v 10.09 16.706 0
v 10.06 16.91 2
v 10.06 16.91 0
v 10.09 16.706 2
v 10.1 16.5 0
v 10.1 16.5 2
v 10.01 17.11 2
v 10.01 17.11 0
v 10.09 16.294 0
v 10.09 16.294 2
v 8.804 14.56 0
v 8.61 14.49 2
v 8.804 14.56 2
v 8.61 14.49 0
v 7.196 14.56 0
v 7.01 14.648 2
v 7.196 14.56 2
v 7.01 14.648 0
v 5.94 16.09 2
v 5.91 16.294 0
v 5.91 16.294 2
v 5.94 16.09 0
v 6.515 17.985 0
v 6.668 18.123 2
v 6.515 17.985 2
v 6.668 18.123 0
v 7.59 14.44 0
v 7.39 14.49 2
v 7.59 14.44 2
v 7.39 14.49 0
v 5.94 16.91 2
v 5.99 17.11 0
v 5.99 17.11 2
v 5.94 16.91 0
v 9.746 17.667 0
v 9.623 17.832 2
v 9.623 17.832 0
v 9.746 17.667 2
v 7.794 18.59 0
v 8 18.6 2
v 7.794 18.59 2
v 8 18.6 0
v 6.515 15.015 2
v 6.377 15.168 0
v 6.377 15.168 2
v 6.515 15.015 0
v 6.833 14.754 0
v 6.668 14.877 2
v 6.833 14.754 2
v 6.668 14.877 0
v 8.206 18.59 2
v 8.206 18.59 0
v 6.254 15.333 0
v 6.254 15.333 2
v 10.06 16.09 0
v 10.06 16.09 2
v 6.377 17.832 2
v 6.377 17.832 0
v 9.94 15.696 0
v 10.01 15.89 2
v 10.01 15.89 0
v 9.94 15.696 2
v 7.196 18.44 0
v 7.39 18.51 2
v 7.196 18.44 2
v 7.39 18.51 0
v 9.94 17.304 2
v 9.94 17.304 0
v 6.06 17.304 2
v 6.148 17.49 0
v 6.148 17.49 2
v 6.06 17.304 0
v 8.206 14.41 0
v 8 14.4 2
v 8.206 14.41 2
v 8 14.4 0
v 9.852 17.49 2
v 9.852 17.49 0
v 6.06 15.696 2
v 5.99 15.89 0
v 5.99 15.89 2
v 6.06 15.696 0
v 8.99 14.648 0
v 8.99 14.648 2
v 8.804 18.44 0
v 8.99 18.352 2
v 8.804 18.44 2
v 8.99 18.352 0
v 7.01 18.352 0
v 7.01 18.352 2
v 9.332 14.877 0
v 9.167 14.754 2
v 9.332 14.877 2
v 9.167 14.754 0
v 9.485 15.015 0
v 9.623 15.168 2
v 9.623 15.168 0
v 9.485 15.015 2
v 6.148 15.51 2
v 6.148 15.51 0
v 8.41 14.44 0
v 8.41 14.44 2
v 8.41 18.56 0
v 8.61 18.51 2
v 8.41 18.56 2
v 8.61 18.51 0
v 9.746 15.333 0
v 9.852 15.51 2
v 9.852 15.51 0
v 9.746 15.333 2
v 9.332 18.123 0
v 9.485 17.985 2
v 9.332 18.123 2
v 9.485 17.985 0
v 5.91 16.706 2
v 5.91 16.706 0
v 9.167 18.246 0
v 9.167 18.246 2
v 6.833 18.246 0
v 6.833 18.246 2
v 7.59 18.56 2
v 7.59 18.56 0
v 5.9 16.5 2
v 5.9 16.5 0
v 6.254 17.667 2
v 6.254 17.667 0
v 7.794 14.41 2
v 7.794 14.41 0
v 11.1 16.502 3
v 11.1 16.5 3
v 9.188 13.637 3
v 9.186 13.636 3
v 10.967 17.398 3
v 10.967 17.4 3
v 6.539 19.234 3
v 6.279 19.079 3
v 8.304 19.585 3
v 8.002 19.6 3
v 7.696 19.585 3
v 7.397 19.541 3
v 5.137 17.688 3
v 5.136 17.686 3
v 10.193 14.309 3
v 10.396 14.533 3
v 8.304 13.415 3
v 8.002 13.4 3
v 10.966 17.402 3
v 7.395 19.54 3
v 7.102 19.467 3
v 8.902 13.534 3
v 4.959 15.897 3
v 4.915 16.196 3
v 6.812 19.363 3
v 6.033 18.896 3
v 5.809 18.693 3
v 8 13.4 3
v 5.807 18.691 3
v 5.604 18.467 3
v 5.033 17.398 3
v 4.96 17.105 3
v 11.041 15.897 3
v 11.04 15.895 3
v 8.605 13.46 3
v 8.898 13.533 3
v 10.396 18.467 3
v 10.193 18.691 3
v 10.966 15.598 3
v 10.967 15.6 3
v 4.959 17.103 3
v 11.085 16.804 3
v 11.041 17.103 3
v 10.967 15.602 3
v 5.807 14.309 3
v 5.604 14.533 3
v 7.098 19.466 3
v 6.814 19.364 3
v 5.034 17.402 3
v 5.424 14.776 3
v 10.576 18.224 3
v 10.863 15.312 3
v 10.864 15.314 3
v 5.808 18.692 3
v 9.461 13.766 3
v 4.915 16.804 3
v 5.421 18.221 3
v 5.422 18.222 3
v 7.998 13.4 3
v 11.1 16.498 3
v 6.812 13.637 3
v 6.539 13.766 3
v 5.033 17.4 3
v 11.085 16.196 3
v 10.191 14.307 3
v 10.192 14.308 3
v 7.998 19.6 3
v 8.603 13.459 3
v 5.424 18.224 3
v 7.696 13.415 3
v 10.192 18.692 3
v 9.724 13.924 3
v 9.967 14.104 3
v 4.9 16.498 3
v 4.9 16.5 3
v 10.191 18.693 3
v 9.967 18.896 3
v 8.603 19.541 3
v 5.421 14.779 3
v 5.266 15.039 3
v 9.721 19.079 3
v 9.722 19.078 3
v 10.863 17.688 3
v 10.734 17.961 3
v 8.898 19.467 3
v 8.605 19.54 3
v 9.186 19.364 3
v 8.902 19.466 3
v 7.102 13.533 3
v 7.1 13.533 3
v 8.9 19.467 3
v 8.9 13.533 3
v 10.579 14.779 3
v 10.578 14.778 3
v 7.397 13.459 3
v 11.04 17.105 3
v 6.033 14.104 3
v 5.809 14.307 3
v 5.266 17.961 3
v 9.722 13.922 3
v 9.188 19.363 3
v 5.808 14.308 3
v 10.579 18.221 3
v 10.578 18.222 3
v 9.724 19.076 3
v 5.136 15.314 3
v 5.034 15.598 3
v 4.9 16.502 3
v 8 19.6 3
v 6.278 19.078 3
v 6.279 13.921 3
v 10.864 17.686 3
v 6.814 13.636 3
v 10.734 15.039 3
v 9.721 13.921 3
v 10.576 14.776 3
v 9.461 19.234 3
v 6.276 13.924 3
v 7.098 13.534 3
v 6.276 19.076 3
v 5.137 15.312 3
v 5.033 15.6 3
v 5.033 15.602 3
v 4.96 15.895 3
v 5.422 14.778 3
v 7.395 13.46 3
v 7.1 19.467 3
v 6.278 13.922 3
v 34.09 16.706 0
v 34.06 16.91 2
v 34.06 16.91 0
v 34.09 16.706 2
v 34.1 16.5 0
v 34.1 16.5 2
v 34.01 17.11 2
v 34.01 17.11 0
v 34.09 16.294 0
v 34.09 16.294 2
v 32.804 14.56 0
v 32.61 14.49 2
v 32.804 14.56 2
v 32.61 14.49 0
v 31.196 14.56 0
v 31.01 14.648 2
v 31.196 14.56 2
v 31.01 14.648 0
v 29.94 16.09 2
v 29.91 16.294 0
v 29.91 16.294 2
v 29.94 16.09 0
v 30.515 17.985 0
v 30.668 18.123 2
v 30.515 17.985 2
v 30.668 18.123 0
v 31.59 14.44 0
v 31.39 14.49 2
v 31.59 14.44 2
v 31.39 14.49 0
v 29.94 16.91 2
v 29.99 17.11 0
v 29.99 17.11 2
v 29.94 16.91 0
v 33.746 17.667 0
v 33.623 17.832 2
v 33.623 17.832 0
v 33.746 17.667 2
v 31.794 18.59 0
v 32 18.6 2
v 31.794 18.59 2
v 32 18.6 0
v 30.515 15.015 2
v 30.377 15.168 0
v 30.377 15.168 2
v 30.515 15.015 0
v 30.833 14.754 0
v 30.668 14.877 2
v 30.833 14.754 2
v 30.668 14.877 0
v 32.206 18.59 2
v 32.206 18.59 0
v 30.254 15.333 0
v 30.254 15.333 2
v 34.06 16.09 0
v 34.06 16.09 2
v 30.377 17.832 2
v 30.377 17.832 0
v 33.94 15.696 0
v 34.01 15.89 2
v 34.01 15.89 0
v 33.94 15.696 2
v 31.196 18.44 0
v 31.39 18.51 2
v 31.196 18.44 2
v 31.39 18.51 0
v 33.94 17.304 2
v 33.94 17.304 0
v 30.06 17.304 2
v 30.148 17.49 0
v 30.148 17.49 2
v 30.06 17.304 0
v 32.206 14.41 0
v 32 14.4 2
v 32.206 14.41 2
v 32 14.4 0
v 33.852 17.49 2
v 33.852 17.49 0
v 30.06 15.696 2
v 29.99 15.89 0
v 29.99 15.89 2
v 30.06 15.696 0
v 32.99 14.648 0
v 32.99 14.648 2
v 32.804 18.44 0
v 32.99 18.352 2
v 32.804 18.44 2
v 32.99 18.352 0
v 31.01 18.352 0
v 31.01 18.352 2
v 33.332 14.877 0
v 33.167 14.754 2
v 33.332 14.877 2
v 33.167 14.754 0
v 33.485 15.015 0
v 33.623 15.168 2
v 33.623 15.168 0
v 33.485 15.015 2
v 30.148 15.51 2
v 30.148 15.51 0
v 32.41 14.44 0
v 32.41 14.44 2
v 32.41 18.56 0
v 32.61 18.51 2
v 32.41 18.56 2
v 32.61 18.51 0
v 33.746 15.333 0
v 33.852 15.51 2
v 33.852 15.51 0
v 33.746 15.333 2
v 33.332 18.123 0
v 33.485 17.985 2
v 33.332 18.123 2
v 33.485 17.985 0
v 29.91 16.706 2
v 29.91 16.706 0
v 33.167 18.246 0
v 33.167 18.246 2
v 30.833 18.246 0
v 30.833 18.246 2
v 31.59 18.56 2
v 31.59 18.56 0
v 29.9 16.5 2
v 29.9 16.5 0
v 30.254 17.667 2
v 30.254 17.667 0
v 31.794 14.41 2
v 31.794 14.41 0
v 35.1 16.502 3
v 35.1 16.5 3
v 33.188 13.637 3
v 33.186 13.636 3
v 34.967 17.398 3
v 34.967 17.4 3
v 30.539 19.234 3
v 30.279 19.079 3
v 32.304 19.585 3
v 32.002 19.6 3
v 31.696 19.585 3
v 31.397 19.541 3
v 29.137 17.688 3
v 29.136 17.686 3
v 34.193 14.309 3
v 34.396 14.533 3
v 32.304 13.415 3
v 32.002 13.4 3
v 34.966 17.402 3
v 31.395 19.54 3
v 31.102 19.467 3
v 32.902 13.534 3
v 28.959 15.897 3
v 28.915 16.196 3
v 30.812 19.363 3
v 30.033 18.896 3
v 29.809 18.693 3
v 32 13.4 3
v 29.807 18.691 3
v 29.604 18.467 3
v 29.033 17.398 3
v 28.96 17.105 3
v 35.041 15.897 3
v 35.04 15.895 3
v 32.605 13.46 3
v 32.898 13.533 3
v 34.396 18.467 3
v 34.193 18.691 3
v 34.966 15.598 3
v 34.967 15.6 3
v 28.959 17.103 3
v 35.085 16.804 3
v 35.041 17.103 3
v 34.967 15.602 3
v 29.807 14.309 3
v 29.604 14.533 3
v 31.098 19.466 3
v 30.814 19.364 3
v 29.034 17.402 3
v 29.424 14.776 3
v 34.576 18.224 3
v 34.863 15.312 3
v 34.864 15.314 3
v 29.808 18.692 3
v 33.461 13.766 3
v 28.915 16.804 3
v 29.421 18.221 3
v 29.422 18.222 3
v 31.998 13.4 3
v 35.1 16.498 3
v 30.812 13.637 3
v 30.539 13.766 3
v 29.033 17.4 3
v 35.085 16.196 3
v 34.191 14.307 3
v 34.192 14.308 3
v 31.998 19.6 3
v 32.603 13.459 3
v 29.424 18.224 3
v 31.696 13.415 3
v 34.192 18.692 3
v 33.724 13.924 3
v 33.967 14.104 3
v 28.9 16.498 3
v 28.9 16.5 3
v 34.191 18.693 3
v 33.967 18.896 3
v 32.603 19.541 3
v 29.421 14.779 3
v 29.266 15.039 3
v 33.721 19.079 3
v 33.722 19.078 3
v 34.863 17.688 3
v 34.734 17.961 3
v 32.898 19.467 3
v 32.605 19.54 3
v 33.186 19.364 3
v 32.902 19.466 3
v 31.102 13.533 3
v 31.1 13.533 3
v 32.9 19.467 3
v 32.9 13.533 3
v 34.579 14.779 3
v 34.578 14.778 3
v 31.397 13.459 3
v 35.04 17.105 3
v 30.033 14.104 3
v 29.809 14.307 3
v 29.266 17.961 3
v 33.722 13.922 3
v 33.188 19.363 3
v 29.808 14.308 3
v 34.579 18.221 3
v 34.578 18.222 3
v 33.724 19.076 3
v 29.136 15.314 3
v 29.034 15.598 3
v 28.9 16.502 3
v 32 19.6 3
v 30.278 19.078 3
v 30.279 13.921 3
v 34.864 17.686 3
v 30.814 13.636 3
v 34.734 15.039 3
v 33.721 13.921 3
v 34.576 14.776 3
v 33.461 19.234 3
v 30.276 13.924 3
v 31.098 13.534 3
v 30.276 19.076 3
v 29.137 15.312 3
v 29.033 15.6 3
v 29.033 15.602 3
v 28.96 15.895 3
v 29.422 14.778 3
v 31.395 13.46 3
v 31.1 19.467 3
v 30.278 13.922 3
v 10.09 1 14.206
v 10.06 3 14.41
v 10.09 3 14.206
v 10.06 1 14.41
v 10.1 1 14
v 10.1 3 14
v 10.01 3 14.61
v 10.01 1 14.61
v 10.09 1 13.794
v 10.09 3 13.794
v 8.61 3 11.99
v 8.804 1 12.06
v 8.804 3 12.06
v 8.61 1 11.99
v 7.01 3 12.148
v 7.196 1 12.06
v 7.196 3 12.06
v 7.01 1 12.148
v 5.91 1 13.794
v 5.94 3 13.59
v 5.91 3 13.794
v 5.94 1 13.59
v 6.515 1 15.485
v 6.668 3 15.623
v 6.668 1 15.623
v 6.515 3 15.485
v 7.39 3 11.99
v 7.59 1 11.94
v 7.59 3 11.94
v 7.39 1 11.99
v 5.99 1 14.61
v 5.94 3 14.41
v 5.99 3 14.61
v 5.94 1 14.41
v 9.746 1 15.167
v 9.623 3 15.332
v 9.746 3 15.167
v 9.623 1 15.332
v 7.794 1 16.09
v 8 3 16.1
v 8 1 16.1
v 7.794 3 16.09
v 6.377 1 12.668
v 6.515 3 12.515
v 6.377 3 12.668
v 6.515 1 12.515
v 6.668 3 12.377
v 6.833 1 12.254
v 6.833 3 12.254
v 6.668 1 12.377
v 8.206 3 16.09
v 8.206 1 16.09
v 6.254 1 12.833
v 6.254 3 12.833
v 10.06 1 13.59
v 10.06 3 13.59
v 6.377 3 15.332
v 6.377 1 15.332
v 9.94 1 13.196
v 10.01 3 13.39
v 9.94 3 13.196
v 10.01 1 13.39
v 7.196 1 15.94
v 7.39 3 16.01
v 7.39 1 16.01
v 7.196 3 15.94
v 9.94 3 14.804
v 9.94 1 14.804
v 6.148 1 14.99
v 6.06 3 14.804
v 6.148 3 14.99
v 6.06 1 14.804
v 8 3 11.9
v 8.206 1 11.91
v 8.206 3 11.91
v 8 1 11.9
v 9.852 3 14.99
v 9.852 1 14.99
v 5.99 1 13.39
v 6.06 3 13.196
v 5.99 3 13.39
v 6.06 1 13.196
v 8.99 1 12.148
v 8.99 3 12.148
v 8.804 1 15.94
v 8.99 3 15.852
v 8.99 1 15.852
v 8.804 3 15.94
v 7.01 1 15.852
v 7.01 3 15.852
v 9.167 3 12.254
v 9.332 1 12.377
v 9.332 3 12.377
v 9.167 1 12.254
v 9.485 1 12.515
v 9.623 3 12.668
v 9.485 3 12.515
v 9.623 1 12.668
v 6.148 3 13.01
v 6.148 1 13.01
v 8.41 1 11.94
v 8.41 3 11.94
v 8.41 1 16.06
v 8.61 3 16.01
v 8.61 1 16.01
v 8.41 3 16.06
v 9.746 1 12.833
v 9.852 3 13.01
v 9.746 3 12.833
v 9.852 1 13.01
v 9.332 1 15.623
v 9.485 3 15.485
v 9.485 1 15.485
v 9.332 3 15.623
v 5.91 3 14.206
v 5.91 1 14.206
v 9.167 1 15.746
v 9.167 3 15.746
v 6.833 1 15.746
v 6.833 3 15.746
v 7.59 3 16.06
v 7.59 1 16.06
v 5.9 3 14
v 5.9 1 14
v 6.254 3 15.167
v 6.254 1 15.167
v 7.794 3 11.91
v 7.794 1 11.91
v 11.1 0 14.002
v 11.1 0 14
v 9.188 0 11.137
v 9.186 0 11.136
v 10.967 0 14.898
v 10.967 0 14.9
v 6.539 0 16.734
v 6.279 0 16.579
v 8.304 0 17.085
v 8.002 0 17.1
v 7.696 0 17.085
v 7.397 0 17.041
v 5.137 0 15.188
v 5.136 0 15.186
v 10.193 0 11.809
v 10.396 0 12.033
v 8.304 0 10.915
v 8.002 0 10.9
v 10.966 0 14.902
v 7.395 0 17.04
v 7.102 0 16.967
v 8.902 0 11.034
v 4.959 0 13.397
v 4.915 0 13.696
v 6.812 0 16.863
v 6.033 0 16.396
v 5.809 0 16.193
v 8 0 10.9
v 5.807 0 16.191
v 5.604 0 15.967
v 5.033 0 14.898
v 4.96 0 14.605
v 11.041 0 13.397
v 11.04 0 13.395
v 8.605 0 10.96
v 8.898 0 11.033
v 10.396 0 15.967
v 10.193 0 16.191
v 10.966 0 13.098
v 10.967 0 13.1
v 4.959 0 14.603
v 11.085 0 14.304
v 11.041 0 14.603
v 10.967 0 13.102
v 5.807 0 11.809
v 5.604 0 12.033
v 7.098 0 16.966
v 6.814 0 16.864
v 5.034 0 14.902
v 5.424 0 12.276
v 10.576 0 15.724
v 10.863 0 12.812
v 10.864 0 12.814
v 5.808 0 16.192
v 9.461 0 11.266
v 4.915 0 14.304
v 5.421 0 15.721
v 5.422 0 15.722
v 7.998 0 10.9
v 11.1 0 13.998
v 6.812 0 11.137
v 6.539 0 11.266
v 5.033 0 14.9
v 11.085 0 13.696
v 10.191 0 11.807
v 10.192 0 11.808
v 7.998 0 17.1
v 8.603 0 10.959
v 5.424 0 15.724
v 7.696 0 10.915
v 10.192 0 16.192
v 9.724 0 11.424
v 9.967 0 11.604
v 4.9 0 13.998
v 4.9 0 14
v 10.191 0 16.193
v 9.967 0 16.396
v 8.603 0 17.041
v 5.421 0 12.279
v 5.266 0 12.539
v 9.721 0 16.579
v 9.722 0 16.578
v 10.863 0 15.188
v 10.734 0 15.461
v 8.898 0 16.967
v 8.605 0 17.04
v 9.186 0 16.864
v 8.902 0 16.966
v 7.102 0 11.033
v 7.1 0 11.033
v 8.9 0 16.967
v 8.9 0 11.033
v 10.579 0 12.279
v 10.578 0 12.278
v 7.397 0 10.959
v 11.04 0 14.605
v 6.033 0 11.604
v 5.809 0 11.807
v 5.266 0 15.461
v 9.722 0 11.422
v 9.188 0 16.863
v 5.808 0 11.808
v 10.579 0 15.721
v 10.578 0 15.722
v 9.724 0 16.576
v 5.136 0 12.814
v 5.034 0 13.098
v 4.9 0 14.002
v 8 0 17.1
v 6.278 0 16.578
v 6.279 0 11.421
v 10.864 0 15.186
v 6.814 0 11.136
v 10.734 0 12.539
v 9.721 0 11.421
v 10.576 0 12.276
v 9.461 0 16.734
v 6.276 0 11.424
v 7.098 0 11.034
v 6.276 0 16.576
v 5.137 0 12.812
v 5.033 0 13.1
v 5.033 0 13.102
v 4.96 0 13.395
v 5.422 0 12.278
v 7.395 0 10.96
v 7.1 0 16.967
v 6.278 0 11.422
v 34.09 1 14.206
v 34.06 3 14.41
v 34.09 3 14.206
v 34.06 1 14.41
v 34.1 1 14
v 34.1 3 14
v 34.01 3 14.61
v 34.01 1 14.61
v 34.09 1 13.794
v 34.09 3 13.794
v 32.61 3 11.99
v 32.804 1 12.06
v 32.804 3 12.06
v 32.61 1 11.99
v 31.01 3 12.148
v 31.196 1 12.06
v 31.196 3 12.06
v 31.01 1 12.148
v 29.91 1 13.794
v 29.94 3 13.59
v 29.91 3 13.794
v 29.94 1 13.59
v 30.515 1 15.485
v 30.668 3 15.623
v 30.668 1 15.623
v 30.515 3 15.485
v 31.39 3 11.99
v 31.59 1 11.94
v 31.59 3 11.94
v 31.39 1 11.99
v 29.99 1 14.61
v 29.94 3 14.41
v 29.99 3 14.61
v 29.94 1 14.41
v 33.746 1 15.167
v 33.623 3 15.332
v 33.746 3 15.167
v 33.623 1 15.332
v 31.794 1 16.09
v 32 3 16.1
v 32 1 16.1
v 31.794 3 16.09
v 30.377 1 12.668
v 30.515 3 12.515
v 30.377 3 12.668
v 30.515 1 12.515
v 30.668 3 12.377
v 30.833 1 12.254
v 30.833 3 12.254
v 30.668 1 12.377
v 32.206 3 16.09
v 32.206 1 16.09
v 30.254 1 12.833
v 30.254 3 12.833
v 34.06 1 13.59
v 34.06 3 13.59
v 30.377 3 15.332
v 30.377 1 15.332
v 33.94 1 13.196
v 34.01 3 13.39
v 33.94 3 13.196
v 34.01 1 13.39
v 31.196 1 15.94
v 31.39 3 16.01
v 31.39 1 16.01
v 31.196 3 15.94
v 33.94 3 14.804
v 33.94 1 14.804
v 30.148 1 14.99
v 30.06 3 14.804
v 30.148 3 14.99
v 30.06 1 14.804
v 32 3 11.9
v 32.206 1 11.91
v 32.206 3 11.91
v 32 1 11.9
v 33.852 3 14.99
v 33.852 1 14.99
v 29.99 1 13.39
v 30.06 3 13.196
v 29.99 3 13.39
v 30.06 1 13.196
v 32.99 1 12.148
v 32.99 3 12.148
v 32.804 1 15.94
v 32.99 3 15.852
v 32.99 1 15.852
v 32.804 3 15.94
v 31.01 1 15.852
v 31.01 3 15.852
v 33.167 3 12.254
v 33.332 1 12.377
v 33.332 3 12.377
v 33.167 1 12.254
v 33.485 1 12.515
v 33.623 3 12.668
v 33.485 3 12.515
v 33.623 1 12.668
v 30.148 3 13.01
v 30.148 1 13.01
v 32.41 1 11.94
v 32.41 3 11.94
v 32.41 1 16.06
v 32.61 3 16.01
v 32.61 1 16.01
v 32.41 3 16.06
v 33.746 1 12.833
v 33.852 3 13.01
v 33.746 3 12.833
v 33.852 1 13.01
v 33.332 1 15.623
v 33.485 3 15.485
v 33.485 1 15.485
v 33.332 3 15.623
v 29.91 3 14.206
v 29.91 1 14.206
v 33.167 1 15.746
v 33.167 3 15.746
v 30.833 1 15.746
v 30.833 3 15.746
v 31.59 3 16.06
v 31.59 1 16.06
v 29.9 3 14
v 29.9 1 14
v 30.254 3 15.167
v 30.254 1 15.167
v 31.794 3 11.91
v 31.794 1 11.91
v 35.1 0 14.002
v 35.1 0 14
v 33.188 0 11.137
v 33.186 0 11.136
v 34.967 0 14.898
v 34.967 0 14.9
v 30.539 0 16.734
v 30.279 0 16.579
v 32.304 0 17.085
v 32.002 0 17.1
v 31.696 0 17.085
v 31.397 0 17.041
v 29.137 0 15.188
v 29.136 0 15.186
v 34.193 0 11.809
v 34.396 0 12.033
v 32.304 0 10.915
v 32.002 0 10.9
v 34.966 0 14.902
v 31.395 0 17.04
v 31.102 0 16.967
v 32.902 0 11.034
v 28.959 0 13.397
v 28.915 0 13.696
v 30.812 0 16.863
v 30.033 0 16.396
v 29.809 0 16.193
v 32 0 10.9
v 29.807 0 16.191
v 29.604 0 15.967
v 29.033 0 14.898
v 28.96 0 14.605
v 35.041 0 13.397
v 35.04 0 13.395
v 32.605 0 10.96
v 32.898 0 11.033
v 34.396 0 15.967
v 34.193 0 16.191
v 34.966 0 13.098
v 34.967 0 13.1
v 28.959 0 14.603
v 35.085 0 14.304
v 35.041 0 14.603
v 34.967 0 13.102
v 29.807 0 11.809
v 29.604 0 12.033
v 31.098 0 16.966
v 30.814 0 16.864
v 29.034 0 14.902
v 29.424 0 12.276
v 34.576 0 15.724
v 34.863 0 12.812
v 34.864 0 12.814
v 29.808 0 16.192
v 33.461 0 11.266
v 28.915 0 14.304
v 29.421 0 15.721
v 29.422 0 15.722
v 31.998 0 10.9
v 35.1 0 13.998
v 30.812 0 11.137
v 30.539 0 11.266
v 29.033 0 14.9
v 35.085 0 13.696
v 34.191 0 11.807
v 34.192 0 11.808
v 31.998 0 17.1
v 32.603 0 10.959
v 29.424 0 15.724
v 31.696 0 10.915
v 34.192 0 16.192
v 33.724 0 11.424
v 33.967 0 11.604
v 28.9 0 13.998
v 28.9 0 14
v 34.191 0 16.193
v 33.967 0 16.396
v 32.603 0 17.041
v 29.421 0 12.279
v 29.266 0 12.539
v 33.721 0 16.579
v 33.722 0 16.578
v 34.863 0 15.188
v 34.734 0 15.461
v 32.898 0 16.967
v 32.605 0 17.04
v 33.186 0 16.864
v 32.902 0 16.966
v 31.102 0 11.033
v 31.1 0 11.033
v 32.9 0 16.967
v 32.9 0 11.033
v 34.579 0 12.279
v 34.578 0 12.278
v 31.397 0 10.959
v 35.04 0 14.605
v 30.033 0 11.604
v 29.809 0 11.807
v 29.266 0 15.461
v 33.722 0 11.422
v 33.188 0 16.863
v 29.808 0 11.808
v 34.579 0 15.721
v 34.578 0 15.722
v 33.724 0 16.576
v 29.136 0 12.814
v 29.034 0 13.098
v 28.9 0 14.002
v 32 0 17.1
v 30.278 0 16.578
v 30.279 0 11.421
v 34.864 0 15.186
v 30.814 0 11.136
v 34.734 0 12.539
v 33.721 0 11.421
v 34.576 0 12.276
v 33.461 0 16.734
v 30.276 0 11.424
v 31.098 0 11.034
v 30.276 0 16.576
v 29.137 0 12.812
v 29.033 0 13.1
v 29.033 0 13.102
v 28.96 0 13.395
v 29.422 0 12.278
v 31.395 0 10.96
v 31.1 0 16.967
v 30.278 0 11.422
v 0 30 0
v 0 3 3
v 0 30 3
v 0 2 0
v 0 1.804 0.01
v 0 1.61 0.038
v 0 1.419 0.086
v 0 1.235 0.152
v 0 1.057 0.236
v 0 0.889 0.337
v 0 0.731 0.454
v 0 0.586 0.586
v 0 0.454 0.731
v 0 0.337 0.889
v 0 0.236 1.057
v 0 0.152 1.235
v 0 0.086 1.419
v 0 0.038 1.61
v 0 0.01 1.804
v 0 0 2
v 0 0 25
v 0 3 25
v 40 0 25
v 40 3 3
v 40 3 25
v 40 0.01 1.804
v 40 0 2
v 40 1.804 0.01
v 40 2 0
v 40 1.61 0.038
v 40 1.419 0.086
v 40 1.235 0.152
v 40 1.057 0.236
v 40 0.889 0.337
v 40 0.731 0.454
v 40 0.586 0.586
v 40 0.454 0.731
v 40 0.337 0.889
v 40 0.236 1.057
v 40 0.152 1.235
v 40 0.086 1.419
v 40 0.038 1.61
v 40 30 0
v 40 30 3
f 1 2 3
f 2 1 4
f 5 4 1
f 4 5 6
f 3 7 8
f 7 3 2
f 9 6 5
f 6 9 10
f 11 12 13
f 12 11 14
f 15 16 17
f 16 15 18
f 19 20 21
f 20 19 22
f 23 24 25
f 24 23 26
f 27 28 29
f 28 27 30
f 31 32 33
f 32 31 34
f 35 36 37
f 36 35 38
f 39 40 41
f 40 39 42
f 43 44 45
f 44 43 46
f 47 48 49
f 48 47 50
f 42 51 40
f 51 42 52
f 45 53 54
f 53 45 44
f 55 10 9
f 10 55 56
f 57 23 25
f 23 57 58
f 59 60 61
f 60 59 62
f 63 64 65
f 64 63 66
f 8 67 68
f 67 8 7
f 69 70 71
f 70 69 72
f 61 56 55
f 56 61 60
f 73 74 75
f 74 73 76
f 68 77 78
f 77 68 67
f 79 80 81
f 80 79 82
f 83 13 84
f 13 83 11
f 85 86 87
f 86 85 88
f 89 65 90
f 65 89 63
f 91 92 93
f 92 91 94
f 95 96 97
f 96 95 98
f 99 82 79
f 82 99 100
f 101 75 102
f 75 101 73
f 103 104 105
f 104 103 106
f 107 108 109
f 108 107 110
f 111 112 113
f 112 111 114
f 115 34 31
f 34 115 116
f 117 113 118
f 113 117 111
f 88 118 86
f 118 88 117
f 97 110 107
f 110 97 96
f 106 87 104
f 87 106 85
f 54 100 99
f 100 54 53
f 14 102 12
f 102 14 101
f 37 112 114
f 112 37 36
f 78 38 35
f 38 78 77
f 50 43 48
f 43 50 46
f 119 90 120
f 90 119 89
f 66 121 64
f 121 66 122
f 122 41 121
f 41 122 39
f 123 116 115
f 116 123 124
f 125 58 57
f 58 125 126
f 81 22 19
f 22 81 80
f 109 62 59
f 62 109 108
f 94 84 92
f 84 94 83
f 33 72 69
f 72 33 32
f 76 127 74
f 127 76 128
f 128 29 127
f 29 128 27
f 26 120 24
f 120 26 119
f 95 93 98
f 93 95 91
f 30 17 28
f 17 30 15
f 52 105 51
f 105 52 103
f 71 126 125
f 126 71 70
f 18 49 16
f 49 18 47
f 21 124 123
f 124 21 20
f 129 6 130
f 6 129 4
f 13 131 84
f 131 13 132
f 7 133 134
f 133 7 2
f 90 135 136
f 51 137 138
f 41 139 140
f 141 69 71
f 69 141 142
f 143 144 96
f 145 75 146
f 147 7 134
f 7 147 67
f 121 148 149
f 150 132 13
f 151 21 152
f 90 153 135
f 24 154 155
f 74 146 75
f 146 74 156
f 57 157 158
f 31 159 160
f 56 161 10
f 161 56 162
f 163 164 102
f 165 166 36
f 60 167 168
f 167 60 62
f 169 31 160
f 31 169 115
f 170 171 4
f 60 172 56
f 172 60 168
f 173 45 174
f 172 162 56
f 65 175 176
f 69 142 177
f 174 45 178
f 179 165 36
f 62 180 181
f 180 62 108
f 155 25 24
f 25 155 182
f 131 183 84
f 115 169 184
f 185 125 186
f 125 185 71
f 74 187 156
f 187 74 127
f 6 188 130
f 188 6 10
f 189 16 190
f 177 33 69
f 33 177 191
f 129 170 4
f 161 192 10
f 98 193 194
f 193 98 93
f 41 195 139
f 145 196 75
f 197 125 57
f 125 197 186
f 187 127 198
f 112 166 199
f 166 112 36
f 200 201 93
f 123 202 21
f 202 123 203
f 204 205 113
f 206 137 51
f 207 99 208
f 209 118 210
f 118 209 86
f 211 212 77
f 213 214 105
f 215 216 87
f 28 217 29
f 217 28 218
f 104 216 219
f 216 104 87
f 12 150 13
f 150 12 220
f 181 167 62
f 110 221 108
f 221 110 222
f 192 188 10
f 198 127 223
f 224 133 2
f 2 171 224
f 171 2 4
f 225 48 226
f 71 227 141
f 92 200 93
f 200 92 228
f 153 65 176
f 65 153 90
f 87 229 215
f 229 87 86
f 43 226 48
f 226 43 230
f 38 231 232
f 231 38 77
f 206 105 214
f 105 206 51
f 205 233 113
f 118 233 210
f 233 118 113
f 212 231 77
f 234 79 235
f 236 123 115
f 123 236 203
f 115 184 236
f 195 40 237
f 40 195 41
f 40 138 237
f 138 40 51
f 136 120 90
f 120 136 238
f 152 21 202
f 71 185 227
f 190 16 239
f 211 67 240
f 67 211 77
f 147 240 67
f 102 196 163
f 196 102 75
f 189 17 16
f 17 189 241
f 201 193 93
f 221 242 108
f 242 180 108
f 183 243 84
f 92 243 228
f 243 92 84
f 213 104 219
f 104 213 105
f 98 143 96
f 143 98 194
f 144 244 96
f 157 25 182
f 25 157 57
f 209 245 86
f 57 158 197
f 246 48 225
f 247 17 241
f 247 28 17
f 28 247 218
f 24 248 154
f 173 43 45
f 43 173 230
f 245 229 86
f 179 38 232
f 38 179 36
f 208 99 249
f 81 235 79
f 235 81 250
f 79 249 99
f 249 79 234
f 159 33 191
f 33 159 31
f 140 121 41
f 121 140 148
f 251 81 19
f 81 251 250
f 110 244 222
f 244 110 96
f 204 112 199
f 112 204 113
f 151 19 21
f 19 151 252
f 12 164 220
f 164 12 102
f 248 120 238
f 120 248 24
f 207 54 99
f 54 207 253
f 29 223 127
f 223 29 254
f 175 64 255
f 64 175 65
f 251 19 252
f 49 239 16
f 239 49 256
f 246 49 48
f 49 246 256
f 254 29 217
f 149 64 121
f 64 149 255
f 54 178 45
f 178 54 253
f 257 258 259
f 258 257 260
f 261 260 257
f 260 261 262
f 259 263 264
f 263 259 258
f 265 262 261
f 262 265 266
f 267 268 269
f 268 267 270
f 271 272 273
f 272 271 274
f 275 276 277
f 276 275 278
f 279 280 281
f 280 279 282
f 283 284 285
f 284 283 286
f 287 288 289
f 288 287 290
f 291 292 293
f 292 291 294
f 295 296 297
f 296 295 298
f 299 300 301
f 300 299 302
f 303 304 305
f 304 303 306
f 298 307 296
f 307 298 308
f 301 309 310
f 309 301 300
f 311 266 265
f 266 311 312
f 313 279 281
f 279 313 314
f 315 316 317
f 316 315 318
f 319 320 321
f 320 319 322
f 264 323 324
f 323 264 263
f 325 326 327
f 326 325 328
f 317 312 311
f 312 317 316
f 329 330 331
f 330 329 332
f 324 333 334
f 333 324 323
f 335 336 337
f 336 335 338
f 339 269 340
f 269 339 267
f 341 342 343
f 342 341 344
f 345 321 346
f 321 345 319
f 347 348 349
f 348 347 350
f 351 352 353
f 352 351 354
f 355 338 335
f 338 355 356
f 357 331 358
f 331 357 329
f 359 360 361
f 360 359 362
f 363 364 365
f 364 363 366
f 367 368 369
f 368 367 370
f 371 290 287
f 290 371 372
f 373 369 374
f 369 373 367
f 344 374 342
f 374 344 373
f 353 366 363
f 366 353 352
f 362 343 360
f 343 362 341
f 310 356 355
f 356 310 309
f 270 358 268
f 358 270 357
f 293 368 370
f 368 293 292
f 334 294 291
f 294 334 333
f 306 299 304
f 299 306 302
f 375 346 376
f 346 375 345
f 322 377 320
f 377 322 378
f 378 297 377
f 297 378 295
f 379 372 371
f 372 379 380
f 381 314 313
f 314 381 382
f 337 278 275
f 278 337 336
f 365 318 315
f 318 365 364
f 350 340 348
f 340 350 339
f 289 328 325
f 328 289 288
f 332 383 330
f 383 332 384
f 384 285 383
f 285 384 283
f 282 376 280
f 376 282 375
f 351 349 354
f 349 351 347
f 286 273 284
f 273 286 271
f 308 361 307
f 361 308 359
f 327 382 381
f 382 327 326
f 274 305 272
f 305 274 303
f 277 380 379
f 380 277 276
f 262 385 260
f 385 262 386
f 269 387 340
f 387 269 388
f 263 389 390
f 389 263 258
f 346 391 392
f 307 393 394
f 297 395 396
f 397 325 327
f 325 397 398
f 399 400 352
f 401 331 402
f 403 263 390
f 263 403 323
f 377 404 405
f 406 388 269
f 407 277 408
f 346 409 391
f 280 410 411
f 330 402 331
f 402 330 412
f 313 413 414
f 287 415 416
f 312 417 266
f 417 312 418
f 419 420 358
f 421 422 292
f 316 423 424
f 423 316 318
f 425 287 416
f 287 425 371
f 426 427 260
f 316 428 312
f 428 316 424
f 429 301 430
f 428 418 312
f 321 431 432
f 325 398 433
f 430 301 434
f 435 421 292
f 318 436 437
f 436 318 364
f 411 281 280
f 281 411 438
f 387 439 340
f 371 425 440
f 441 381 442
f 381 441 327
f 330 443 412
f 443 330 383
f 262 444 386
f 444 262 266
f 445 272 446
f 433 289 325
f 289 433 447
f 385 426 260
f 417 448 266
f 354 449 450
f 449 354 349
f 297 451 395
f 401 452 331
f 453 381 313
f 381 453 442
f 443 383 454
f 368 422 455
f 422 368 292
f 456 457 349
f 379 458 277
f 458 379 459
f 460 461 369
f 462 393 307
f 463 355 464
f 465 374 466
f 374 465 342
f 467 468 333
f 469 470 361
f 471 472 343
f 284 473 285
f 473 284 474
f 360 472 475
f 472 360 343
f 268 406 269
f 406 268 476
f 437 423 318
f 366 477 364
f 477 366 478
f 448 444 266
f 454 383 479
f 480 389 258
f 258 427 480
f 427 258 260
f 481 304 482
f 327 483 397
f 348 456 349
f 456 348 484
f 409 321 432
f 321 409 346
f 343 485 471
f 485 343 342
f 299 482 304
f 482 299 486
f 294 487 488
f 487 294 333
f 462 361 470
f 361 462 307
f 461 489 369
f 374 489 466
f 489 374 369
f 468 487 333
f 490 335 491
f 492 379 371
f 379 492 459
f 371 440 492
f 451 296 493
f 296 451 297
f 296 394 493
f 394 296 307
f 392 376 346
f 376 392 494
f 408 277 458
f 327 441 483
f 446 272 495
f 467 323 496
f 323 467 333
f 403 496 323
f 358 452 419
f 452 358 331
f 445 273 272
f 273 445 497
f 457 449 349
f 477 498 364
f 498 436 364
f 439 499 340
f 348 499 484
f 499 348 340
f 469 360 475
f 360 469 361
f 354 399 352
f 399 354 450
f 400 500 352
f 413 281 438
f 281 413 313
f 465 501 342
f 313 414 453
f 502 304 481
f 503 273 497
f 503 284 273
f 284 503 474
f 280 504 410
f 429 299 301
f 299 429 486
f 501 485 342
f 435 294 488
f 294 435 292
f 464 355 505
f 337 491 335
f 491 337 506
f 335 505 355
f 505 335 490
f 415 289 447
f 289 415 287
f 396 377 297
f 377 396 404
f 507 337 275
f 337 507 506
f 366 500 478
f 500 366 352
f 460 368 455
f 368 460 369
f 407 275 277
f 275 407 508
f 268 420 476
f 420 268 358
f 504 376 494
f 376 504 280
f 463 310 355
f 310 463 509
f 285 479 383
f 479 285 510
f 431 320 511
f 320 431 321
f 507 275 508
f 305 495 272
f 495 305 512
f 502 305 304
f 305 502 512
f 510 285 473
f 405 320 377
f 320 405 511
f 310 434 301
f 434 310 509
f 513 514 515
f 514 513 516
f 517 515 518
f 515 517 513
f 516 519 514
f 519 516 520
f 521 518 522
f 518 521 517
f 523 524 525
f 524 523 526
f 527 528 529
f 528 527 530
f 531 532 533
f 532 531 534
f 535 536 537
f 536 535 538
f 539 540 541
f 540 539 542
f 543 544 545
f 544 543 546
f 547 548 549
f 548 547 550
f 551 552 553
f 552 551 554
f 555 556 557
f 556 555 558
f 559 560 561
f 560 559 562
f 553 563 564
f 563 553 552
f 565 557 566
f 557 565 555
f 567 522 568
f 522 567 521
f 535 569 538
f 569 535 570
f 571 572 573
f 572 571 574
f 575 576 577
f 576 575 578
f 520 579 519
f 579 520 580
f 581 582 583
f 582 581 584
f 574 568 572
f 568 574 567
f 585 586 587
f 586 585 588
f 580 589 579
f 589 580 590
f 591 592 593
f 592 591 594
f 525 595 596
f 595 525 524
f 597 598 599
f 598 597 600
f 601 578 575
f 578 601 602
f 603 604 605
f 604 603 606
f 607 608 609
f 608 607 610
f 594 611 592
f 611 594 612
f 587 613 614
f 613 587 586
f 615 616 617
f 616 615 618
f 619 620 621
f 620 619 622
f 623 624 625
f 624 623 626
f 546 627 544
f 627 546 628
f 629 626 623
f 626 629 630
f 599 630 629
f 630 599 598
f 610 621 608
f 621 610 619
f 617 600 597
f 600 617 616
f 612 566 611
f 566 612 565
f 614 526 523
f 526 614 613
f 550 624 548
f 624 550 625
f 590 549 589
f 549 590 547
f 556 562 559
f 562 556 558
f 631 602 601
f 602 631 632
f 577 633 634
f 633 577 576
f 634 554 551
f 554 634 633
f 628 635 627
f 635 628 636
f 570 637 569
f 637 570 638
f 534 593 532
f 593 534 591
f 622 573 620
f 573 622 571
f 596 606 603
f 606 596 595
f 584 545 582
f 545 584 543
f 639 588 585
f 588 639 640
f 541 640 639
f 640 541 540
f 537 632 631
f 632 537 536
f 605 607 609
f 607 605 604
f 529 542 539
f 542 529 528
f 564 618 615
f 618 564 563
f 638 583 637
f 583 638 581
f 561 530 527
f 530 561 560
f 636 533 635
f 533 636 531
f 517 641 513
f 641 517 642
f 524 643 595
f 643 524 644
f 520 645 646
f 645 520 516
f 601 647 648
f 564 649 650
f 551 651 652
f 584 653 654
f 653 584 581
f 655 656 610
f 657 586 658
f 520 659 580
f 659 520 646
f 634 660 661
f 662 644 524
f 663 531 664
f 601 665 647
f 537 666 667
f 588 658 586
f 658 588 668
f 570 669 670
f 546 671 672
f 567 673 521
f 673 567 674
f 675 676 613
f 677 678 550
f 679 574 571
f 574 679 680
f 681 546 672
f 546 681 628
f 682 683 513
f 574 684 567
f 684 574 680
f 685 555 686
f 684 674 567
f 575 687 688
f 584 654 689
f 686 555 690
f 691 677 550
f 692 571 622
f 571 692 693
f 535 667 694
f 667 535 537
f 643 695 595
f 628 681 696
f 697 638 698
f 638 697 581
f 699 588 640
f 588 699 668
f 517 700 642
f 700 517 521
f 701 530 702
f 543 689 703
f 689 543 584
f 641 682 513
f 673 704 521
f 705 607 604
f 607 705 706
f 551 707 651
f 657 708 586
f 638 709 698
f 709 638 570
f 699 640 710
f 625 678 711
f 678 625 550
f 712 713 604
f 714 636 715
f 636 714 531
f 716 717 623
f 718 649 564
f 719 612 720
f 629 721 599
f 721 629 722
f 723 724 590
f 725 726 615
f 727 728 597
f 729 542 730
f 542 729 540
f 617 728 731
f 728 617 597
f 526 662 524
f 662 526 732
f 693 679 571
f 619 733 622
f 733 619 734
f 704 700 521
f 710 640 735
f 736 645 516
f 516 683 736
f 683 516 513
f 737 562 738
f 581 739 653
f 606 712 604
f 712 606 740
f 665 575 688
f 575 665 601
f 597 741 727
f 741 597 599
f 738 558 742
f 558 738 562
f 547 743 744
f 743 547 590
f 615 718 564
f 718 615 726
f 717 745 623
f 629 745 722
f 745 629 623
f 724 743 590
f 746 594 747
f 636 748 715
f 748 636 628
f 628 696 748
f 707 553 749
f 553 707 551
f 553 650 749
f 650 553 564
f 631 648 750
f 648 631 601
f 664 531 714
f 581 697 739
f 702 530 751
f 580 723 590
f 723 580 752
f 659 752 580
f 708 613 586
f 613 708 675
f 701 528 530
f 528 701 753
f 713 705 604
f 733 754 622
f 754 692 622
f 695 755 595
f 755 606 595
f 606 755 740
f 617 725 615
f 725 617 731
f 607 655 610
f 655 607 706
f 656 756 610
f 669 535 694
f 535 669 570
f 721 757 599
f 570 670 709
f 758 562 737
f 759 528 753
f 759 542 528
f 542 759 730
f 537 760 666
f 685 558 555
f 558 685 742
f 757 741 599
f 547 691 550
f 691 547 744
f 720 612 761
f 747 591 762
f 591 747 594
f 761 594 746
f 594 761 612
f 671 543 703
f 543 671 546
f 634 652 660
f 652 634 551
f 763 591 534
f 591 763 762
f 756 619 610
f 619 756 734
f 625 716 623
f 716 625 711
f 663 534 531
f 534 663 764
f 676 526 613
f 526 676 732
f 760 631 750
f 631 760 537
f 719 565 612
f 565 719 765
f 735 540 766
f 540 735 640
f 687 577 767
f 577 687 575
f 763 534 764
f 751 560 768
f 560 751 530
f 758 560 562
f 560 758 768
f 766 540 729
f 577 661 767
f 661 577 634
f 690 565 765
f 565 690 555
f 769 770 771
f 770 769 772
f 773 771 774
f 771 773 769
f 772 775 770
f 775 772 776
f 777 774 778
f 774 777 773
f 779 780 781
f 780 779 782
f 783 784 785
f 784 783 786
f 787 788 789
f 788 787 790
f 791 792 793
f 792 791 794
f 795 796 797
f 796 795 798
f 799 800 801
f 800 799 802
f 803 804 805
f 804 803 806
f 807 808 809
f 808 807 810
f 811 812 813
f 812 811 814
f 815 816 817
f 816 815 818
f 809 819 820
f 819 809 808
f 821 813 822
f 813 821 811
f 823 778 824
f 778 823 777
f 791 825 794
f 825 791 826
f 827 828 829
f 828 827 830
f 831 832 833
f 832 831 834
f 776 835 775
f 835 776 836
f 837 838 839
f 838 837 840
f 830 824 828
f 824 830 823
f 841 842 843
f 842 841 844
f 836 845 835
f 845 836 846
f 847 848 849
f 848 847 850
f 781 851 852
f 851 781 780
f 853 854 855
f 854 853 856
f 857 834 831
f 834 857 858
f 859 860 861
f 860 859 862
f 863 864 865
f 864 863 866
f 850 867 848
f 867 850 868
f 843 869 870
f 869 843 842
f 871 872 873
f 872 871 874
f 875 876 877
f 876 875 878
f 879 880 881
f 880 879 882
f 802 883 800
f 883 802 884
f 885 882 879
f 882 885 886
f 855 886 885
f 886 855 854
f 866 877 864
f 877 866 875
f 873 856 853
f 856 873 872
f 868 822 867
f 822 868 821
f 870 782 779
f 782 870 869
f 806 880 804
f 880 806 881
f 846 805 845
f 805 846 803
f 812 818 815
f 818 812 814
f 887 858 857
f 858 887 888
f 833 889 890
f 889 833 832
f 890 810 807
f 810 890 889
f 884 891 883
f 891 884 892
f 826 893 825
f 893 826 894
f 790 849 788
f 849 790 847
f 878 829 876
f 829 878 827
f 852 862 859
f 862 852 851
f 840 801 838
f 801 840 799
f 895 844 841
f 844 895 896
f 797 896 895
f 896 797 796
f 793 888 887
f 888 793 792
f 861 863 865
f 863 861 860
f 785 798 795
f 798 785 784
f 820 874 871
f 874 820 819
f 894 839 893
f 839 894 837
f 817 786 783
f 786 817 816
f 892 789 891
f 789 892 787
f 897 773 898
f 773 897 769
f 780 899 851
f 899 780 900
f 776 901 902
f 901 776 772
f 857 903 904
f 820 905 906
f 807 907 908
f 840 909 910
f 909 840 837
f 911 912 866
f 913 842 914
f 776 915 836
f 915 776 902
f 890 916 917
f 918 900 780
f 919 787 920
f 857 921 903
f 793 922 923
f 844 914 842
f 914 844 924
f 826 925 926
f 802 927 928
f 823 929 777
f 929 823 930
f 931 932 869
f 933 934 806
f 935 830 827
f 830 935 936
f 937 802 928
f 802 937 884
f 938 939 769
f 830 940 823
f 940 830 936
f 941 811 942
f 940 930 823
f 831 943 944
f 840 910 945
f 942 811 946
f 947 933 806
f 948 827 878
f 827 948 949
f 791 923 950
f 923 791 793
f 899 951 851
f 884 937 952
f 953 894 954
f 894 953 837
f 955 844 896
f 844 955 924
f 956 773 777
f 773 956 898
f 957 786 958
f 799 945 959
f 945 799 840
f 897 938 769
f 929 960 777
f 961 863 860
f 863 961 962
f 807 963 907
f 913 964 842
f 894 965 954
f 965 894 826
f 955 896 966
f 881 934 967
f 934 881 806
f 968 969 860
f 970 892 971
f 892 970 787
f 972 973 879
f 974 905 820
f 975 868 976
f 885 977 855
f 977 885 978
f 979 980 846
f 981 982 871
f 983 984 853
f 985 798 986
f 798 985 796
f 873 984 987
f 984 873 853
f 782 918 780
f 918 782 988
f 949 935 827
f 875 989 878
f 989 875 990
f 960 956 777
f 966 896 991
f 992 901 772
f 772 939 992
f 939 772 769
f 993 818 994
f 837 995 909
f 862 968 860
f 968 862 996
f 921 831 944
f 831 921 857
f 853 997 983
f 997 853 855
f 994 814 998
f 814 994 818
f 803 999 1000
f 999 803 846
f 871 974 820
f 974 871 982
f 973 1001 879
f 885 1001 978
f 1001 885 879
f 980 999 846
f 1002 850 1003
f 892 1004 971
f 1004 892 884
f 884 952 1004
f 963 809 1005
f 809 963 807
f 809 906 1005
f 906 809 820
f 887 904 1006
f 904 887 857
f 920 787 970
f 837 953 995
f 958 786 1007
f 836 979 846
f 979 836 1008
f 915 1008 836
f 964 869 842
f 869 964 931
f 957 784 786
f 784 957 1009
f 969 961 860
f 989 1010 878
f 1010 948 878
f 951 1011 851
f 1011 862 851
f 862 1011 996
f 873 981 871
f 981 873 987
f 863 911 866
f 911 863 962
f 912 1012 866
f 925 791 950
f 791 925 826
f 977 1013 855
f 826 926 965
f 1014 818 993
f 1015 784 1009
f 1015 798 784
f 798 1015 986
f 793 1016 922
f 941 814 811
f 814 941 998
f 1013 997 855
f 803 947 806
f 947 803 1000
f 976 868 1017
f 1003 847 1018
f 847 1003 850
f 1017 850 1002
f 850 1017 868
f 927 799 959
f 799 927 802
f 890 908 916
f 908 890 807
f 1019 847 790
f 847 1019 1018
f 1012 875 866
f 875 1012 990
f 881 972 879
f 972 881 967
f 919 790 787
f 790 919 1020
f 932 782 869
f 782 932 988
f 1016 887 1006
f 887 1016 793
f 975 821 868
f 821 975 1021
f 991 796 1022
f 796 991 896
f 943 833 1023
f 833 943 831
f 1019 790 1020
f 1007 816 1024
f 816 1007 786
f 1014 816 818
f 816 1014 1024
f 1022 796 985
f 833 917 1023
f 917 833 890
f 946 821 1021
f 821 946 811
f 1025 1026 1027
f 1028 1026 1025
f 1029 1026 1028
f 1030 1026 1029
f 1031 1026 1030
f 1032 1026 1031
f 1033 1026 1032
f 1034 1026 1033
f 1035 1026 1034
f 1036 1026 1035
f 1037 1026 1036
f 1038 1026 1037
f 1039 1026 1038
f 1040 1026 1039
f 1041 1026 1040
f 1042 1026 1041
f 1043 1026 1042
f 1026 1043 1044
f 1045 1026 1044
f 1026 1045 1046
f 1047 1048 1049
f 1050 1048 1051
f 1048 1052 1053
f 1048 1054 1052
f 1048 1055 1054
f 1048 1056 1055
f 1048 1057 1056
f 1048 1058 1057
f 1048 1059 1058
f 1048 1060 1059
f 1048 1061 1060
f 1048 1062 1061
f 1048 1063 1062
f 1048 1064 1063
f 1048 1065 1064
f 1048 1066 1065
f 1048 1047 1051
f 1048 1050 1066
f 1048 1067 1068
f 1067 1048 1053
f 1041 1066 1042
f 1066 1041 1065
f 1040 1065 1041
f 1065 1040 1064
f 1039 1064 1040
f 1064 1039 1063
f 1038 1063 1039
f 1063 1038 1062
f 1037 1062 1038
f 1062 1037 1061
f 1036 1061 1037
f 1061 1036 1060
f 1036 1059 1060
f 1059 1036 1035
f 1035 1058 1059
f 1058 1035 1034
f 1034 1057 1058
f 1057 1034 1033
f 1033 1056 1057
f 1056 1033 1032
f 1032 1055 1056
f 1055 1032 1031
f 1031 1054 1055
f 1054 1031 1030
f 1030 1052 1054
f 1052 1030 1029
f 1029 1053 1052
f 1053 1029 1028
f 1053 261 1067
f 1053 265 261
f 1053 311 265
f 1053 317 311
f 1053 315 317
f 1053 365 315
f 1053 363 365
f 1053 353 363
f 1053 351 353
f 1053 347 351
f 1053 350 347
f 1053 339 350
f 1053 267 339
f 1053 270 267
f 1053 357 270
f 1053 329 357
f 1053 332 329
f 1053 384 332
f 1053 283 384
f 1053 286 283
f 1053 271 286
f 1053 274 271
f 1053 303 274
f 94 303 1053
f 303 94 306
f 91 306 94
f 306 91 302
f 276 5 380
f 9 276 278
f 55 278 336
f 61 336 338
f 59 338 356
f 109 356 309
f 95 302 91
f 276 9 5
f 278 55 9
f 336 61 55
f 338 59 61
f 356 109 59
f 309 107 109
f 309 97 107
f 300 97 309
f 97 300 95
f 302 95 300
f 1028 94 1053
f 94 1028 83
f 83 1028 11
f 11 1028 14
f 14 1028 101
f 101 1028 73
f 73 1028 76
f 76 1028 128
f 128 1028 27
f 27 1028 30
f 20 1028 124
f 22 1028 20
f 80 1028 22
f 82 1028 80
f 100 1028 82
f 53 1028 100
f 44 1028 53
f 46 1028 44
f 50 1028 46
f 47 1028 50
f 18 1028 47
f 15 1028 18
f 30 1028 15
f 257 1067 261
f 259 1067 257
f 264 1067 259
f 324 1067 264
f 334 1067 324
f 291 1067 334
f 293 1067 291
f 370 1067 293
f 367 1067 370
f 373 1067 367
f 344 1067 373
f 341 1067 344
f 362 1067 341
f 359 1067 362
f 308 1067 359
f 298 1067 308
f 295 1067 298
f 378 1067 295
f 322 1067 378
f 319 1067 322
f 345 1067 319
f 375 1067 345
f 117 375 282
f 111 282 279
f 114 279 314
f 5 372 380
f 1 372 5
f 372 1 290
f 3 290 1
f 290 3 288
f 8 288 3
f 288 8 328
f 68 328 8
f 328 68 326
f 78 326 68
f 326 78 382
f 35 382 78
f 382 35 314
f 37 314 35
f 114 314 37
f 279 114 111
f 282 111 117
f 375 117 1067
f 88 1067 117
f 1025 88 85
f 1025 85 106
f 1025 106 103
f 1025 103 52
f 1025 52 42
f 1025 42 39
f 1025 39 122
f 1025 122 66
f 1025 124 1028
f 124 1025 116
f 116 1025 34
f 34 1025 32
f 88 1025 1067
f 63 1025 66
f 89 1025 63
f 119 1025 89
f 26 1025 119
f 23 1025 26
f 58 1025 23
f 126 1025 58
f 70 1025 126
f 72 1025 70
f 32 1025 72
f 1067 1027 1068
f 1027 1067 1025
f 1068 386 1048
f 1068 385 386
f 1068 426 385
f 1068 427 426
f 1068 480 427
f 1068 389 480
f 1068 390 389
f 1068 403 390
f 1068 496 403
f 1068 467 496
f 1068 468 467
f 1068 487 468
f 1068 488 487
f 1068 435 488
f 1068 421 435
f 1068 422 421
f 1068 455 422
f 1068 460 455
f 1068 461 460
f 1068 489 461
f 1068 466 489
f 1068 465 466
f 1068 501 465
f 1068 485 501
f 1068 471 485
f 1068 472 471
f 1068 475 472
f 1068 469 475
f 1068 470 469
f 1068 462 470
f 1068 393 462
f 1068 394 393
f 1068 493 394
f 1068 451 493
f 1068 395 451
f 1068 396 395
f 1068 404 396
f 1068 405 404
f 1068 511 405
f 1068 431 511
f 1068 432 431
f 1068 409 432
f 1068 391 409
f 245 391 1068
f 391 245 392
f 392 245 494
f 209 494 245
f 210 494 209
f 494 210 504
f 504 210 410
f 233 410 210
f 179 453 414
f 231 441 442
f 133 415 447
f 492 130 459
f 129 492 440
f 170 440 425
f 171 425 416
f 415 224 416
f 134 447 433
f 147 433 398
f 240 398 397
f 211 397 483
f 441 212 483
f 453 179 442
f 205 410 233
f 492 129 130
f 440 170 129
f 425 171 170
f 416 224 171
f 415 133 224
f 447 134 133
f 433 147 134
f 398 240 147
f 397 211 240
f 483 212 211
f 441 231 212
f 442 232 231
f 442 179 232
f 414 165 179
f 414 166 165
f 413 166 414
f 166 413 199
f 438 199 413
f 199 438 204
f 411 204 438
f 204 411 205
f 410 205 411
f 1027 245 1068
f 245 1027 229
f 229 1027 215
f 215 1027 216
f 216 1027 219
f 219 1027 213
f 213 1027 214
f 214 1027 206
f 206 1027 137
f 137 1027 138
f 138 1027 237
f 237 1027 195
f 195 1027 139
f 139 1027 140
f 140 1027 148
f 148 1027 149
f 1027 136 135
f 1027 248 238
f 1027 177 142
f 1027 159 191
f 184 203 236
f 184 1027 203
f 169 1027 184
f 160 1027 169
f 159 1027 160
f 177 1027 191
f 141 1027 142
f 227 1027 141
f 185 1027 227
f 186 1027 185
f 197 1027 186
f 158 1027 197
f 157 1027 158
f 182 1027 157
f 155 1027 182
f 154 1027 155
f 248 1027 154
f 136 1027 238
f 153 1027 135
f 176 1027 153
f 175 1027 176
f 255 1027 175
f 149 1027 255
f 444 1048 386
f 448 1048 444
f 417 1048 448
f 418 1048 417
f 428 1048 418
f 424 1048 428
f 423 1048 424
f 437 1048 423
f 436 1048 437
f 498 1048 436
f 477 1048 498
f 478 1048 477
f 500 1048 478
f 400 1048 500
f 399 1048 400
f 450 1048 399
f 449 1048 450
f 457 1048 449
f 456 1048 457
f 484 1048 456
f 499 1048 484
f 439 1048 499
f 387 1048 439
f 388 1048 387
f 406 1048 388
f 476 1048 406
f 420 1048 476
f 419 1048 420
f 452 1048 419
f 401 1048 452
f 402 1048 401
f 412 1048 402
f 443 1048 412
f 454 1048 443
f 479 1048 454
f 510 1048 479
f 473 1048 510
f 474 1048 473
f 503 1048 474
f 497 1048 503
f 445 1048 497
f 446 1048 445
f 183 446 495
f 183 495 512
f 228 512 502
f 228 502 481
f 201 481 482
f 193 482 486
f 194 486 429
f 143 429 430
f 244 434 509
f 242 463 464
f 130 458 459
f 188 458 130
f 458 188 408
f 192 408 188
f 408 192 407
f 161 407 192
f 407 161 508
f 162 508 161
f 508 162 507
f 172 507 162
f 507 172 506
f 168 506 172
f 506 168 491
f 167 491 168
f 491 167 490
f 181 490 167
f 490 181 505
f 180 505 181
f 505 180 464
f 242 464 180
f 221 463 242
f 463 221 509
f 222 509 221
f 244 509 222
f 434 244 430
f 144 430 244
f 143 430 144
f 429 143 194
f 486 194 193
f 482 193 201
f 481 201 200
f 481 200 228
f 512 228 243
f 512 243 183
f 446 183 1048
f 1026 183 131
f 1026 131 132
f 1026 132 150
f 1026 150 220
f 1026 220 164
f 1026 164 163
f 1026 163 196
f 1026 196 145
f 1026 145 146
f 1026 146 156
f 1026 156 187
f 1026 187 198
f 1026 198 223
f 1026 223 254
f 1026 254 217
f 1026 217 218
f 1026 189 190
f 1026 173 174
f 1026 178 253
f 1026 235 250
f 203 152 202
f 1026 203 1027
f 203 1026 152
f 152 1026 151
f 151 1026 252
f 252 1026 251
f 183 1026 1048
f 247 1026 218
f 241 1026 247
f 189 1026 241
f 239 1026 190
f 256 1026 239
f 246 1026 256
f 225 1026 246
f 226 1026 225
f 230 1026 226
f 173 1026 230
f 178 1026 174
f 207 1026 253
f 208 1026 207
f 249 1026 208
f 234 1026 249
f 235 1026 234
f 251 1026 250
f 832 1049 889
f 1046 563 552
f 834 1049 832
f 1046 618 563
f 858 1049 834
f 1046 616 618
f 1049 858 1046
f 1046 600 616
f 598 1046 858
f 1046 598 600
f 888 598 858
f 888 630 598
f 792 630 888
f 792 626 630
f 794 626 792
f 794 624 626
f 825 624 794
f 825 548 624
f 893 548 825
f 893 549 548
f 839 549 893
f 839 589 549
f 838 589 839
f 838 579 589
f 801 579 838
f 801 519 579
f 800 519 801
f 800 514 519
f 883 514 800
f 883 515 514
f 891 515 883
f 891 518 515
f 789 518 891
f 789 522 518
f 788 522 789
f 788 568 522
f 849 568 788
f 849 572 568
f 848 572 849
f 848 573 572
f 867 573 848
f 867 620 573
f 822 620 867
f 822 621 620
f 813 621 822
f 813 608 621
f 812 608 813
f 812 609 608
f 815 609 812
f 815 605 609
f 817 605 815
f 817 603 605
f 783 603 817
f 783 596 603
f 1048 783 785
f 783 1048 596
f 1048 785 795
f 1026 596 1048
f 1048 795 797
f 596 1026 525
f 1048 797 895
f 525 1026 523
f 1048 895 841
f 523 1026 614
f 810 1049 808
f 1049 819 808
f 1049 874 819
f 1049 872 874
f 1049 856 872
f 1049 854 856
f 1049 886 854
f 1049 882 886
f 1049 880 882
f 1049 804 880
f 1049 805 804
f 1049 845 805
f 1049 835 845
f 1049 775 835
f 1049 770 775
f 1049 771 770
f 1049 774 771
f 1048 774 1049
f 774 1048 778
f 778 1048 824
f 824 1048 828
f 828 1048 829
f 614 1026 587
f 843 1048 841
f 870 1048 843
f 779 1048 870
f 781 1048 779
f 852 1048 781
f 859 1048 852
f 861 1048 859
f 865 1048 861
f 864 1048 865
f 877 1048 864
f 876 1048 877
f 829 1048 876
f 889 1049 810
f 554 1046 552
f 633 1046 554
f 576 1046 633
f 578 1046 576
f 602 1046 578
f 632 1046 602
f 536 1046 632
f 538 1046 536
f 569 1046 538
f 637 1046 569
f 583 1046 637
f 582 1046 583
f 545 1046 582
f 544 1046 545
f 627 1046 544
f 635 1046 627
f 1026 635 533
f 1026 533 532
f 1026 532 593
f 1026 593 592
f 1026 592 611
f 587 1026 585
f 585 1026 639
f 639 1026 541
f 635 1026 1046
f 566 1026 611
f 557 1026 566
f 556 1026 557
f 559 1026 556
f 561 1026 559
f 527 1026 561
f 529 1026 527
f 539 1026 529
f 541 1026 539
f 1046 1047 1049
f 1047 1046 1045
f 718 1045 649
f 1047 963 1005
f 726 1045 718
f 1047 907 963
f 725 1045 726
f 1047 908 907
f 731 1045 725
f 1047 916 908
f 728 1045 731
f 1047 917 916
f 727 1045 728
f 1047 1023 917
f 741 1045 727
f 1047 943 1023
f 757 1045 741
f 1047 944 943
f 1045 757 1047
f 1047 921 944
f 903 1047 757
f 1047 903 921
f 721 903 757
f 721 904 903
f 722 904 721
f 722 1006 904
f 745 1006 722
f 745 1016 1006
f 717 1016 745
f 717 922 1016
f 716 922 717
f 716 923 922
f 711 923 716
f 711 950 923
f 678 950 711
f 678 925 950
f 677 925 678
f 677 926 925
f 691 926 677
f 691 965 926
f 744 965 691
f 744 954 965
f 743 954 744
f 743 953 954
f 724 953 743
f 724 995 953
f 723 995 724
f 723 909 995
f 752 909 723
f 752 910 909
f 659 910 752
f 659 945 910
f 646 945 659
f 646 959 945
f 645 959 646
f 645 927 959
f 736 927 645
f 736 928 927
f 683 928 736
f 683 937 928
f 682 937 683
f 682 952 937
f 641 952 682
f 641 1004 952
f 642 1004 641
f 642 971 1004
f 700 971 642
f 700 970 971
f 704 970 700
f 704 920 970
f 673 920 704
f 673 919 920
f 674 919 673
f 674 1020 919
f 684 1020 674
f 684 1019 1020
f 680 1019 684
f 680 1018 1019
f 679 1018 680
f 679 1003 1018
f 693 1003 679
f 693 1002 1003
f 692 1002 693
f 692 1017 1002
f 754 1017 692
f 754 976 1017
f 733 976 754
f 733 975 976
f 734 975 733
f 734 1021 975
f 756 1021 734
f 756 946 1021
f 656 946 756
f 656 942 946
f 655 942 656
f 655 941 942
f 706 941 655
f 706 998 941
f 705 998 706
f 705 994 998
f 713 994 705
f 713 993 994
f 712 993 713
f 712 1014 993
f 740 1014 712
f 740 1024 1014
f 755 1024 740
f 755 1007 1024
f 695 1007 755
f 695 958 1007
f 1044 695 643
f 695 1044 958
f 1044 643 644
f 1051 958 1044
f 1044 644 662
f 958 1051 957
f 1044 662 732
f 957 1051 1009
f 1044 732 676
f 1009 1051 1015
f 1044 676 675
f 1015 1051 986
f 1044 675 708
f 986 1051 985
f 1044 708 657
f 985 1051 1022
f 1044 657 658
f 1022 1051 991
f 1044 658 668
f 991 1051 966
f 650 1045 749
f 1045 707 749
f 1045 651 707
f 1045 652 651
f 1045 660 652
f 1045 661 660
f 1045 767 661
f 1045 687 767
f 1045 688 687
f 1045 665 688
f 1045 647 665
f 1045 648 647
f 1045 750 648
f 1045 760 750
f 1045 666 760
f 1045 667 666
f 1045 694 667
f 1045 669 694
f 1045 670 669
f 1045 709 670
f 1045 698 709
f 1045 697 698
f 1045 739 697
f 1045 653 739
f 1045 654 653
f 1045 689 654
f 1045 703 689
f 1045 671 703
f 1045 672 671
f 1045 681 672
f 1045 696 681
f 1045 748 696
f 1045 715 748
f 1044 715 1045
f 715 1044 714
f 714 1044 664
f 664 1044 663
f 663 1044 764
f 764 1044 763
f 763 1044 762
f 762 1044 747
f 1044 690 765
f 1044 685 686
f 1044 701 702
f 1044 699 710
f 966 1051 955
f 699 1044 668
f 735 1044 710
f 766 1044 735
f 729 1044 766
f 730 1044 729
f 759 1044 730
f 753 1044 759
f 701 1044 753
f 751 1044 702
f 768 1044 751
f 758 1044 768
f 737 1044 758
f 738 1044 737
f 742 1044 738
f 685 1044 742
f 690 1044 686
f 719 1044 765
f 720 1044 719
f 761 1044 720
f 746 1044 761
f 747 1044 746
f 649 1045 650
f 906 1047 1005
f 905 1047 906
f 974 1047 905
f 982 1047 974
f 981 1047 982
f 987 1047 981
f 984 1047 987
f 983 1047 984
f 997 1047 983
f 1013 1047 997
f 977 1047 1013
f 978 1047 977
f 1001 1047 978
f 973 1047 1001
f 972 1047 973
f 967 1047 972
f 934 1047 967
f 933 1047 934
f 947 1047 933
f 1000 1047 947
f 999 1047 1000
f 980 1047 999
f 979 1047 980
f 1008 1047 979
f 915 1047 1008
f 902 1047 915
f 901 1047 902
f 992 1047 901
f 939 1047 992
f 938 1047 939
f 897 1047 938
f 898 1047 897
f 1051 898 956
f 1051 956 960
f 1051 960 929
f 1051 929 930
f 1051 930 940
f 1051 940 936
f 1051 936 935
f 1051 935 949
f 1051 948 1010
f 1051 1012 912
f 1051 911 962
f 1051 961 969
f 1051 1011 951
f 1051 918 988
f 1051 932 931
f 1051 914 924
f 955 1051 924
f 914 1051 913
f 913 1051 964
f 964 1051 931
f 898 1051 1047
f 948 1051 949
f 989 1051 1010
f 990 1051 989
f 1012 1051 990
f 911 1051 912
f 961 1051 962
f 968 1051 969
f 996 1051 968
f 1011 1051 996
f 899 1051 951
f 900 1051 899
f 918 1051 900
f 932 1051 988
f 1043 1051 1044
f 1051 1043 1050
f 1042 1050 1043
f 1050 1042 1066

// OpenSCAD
// Parametric L-bracket (mm). Same spec as model.py. Plain OpenSCAD, no libraries.

/* [Plates] */
thickness = 3;       // [1:0.5:10]
width = 40;          // shared X extent of both plates
base_depth = 30;     // horizontal plate, along Y
wall_height = 25;    // vertical plate, along Z
outer_fillet = 2;    // round on the outside corner edge

/* [Holes] */
hole_d = 4.2;
holes_per_leg = 2;
hole_pitch = 24;     // between the two holes, along X
hole_chamfer = 1;    // 45 deg chamfer on the top edge of each hole

/* [Hidden] */
$fn = 64;
eps = 0.01;

t = thickness;
r = outer_fillet;

// L profile in (Y, Z): base along +Y, wall along +Z, outside corner at the origin rounded.
module profile() {
    difference() {
        union() { square([base_depth, t]); square([t, wall_height]); }
        square(r);
    }
    intersection() { translate([r, r]) circle(r); square(r); }
}

// A through hole plus its chamfer cone; +Z is the chamfered (outer) face at z = depth.
module hole(depth) {
    translate([0, 0, -eps]) cylinder(d = hole_d, h = depth + 2 * eps);
    translate([0, 0, depth - hole_chamfer])
        cylinder(h = hole_chamfer + eps, r1 = hole_d / 2, r2 = hole_d / 2 + hole_chamfer + eps);
}

module holes_x() {
    for (i = [0 : holes_per_leg - 1])
        translate([width / 2 + (i - (holes_per_leg - 1) / 2) * hole_pitch, 0, 0]) children();
}

module bracket() {
    difference() {
        rotate([90, 0, 90]) linear_extrude(width) profile();
        // base holes, drilled along -Z, chamfer on the top face z = t
        translate([0, (base_depth + t) / 2, 0]) holes_x() hole(t);
        // wall holes along +Y, chamfer on the outside face y = 0
        translate([0, t, (wall_height + t) / 2]) holes_x() rotate([90, 0, 0]) hole(t);
    }
}

bracket();
